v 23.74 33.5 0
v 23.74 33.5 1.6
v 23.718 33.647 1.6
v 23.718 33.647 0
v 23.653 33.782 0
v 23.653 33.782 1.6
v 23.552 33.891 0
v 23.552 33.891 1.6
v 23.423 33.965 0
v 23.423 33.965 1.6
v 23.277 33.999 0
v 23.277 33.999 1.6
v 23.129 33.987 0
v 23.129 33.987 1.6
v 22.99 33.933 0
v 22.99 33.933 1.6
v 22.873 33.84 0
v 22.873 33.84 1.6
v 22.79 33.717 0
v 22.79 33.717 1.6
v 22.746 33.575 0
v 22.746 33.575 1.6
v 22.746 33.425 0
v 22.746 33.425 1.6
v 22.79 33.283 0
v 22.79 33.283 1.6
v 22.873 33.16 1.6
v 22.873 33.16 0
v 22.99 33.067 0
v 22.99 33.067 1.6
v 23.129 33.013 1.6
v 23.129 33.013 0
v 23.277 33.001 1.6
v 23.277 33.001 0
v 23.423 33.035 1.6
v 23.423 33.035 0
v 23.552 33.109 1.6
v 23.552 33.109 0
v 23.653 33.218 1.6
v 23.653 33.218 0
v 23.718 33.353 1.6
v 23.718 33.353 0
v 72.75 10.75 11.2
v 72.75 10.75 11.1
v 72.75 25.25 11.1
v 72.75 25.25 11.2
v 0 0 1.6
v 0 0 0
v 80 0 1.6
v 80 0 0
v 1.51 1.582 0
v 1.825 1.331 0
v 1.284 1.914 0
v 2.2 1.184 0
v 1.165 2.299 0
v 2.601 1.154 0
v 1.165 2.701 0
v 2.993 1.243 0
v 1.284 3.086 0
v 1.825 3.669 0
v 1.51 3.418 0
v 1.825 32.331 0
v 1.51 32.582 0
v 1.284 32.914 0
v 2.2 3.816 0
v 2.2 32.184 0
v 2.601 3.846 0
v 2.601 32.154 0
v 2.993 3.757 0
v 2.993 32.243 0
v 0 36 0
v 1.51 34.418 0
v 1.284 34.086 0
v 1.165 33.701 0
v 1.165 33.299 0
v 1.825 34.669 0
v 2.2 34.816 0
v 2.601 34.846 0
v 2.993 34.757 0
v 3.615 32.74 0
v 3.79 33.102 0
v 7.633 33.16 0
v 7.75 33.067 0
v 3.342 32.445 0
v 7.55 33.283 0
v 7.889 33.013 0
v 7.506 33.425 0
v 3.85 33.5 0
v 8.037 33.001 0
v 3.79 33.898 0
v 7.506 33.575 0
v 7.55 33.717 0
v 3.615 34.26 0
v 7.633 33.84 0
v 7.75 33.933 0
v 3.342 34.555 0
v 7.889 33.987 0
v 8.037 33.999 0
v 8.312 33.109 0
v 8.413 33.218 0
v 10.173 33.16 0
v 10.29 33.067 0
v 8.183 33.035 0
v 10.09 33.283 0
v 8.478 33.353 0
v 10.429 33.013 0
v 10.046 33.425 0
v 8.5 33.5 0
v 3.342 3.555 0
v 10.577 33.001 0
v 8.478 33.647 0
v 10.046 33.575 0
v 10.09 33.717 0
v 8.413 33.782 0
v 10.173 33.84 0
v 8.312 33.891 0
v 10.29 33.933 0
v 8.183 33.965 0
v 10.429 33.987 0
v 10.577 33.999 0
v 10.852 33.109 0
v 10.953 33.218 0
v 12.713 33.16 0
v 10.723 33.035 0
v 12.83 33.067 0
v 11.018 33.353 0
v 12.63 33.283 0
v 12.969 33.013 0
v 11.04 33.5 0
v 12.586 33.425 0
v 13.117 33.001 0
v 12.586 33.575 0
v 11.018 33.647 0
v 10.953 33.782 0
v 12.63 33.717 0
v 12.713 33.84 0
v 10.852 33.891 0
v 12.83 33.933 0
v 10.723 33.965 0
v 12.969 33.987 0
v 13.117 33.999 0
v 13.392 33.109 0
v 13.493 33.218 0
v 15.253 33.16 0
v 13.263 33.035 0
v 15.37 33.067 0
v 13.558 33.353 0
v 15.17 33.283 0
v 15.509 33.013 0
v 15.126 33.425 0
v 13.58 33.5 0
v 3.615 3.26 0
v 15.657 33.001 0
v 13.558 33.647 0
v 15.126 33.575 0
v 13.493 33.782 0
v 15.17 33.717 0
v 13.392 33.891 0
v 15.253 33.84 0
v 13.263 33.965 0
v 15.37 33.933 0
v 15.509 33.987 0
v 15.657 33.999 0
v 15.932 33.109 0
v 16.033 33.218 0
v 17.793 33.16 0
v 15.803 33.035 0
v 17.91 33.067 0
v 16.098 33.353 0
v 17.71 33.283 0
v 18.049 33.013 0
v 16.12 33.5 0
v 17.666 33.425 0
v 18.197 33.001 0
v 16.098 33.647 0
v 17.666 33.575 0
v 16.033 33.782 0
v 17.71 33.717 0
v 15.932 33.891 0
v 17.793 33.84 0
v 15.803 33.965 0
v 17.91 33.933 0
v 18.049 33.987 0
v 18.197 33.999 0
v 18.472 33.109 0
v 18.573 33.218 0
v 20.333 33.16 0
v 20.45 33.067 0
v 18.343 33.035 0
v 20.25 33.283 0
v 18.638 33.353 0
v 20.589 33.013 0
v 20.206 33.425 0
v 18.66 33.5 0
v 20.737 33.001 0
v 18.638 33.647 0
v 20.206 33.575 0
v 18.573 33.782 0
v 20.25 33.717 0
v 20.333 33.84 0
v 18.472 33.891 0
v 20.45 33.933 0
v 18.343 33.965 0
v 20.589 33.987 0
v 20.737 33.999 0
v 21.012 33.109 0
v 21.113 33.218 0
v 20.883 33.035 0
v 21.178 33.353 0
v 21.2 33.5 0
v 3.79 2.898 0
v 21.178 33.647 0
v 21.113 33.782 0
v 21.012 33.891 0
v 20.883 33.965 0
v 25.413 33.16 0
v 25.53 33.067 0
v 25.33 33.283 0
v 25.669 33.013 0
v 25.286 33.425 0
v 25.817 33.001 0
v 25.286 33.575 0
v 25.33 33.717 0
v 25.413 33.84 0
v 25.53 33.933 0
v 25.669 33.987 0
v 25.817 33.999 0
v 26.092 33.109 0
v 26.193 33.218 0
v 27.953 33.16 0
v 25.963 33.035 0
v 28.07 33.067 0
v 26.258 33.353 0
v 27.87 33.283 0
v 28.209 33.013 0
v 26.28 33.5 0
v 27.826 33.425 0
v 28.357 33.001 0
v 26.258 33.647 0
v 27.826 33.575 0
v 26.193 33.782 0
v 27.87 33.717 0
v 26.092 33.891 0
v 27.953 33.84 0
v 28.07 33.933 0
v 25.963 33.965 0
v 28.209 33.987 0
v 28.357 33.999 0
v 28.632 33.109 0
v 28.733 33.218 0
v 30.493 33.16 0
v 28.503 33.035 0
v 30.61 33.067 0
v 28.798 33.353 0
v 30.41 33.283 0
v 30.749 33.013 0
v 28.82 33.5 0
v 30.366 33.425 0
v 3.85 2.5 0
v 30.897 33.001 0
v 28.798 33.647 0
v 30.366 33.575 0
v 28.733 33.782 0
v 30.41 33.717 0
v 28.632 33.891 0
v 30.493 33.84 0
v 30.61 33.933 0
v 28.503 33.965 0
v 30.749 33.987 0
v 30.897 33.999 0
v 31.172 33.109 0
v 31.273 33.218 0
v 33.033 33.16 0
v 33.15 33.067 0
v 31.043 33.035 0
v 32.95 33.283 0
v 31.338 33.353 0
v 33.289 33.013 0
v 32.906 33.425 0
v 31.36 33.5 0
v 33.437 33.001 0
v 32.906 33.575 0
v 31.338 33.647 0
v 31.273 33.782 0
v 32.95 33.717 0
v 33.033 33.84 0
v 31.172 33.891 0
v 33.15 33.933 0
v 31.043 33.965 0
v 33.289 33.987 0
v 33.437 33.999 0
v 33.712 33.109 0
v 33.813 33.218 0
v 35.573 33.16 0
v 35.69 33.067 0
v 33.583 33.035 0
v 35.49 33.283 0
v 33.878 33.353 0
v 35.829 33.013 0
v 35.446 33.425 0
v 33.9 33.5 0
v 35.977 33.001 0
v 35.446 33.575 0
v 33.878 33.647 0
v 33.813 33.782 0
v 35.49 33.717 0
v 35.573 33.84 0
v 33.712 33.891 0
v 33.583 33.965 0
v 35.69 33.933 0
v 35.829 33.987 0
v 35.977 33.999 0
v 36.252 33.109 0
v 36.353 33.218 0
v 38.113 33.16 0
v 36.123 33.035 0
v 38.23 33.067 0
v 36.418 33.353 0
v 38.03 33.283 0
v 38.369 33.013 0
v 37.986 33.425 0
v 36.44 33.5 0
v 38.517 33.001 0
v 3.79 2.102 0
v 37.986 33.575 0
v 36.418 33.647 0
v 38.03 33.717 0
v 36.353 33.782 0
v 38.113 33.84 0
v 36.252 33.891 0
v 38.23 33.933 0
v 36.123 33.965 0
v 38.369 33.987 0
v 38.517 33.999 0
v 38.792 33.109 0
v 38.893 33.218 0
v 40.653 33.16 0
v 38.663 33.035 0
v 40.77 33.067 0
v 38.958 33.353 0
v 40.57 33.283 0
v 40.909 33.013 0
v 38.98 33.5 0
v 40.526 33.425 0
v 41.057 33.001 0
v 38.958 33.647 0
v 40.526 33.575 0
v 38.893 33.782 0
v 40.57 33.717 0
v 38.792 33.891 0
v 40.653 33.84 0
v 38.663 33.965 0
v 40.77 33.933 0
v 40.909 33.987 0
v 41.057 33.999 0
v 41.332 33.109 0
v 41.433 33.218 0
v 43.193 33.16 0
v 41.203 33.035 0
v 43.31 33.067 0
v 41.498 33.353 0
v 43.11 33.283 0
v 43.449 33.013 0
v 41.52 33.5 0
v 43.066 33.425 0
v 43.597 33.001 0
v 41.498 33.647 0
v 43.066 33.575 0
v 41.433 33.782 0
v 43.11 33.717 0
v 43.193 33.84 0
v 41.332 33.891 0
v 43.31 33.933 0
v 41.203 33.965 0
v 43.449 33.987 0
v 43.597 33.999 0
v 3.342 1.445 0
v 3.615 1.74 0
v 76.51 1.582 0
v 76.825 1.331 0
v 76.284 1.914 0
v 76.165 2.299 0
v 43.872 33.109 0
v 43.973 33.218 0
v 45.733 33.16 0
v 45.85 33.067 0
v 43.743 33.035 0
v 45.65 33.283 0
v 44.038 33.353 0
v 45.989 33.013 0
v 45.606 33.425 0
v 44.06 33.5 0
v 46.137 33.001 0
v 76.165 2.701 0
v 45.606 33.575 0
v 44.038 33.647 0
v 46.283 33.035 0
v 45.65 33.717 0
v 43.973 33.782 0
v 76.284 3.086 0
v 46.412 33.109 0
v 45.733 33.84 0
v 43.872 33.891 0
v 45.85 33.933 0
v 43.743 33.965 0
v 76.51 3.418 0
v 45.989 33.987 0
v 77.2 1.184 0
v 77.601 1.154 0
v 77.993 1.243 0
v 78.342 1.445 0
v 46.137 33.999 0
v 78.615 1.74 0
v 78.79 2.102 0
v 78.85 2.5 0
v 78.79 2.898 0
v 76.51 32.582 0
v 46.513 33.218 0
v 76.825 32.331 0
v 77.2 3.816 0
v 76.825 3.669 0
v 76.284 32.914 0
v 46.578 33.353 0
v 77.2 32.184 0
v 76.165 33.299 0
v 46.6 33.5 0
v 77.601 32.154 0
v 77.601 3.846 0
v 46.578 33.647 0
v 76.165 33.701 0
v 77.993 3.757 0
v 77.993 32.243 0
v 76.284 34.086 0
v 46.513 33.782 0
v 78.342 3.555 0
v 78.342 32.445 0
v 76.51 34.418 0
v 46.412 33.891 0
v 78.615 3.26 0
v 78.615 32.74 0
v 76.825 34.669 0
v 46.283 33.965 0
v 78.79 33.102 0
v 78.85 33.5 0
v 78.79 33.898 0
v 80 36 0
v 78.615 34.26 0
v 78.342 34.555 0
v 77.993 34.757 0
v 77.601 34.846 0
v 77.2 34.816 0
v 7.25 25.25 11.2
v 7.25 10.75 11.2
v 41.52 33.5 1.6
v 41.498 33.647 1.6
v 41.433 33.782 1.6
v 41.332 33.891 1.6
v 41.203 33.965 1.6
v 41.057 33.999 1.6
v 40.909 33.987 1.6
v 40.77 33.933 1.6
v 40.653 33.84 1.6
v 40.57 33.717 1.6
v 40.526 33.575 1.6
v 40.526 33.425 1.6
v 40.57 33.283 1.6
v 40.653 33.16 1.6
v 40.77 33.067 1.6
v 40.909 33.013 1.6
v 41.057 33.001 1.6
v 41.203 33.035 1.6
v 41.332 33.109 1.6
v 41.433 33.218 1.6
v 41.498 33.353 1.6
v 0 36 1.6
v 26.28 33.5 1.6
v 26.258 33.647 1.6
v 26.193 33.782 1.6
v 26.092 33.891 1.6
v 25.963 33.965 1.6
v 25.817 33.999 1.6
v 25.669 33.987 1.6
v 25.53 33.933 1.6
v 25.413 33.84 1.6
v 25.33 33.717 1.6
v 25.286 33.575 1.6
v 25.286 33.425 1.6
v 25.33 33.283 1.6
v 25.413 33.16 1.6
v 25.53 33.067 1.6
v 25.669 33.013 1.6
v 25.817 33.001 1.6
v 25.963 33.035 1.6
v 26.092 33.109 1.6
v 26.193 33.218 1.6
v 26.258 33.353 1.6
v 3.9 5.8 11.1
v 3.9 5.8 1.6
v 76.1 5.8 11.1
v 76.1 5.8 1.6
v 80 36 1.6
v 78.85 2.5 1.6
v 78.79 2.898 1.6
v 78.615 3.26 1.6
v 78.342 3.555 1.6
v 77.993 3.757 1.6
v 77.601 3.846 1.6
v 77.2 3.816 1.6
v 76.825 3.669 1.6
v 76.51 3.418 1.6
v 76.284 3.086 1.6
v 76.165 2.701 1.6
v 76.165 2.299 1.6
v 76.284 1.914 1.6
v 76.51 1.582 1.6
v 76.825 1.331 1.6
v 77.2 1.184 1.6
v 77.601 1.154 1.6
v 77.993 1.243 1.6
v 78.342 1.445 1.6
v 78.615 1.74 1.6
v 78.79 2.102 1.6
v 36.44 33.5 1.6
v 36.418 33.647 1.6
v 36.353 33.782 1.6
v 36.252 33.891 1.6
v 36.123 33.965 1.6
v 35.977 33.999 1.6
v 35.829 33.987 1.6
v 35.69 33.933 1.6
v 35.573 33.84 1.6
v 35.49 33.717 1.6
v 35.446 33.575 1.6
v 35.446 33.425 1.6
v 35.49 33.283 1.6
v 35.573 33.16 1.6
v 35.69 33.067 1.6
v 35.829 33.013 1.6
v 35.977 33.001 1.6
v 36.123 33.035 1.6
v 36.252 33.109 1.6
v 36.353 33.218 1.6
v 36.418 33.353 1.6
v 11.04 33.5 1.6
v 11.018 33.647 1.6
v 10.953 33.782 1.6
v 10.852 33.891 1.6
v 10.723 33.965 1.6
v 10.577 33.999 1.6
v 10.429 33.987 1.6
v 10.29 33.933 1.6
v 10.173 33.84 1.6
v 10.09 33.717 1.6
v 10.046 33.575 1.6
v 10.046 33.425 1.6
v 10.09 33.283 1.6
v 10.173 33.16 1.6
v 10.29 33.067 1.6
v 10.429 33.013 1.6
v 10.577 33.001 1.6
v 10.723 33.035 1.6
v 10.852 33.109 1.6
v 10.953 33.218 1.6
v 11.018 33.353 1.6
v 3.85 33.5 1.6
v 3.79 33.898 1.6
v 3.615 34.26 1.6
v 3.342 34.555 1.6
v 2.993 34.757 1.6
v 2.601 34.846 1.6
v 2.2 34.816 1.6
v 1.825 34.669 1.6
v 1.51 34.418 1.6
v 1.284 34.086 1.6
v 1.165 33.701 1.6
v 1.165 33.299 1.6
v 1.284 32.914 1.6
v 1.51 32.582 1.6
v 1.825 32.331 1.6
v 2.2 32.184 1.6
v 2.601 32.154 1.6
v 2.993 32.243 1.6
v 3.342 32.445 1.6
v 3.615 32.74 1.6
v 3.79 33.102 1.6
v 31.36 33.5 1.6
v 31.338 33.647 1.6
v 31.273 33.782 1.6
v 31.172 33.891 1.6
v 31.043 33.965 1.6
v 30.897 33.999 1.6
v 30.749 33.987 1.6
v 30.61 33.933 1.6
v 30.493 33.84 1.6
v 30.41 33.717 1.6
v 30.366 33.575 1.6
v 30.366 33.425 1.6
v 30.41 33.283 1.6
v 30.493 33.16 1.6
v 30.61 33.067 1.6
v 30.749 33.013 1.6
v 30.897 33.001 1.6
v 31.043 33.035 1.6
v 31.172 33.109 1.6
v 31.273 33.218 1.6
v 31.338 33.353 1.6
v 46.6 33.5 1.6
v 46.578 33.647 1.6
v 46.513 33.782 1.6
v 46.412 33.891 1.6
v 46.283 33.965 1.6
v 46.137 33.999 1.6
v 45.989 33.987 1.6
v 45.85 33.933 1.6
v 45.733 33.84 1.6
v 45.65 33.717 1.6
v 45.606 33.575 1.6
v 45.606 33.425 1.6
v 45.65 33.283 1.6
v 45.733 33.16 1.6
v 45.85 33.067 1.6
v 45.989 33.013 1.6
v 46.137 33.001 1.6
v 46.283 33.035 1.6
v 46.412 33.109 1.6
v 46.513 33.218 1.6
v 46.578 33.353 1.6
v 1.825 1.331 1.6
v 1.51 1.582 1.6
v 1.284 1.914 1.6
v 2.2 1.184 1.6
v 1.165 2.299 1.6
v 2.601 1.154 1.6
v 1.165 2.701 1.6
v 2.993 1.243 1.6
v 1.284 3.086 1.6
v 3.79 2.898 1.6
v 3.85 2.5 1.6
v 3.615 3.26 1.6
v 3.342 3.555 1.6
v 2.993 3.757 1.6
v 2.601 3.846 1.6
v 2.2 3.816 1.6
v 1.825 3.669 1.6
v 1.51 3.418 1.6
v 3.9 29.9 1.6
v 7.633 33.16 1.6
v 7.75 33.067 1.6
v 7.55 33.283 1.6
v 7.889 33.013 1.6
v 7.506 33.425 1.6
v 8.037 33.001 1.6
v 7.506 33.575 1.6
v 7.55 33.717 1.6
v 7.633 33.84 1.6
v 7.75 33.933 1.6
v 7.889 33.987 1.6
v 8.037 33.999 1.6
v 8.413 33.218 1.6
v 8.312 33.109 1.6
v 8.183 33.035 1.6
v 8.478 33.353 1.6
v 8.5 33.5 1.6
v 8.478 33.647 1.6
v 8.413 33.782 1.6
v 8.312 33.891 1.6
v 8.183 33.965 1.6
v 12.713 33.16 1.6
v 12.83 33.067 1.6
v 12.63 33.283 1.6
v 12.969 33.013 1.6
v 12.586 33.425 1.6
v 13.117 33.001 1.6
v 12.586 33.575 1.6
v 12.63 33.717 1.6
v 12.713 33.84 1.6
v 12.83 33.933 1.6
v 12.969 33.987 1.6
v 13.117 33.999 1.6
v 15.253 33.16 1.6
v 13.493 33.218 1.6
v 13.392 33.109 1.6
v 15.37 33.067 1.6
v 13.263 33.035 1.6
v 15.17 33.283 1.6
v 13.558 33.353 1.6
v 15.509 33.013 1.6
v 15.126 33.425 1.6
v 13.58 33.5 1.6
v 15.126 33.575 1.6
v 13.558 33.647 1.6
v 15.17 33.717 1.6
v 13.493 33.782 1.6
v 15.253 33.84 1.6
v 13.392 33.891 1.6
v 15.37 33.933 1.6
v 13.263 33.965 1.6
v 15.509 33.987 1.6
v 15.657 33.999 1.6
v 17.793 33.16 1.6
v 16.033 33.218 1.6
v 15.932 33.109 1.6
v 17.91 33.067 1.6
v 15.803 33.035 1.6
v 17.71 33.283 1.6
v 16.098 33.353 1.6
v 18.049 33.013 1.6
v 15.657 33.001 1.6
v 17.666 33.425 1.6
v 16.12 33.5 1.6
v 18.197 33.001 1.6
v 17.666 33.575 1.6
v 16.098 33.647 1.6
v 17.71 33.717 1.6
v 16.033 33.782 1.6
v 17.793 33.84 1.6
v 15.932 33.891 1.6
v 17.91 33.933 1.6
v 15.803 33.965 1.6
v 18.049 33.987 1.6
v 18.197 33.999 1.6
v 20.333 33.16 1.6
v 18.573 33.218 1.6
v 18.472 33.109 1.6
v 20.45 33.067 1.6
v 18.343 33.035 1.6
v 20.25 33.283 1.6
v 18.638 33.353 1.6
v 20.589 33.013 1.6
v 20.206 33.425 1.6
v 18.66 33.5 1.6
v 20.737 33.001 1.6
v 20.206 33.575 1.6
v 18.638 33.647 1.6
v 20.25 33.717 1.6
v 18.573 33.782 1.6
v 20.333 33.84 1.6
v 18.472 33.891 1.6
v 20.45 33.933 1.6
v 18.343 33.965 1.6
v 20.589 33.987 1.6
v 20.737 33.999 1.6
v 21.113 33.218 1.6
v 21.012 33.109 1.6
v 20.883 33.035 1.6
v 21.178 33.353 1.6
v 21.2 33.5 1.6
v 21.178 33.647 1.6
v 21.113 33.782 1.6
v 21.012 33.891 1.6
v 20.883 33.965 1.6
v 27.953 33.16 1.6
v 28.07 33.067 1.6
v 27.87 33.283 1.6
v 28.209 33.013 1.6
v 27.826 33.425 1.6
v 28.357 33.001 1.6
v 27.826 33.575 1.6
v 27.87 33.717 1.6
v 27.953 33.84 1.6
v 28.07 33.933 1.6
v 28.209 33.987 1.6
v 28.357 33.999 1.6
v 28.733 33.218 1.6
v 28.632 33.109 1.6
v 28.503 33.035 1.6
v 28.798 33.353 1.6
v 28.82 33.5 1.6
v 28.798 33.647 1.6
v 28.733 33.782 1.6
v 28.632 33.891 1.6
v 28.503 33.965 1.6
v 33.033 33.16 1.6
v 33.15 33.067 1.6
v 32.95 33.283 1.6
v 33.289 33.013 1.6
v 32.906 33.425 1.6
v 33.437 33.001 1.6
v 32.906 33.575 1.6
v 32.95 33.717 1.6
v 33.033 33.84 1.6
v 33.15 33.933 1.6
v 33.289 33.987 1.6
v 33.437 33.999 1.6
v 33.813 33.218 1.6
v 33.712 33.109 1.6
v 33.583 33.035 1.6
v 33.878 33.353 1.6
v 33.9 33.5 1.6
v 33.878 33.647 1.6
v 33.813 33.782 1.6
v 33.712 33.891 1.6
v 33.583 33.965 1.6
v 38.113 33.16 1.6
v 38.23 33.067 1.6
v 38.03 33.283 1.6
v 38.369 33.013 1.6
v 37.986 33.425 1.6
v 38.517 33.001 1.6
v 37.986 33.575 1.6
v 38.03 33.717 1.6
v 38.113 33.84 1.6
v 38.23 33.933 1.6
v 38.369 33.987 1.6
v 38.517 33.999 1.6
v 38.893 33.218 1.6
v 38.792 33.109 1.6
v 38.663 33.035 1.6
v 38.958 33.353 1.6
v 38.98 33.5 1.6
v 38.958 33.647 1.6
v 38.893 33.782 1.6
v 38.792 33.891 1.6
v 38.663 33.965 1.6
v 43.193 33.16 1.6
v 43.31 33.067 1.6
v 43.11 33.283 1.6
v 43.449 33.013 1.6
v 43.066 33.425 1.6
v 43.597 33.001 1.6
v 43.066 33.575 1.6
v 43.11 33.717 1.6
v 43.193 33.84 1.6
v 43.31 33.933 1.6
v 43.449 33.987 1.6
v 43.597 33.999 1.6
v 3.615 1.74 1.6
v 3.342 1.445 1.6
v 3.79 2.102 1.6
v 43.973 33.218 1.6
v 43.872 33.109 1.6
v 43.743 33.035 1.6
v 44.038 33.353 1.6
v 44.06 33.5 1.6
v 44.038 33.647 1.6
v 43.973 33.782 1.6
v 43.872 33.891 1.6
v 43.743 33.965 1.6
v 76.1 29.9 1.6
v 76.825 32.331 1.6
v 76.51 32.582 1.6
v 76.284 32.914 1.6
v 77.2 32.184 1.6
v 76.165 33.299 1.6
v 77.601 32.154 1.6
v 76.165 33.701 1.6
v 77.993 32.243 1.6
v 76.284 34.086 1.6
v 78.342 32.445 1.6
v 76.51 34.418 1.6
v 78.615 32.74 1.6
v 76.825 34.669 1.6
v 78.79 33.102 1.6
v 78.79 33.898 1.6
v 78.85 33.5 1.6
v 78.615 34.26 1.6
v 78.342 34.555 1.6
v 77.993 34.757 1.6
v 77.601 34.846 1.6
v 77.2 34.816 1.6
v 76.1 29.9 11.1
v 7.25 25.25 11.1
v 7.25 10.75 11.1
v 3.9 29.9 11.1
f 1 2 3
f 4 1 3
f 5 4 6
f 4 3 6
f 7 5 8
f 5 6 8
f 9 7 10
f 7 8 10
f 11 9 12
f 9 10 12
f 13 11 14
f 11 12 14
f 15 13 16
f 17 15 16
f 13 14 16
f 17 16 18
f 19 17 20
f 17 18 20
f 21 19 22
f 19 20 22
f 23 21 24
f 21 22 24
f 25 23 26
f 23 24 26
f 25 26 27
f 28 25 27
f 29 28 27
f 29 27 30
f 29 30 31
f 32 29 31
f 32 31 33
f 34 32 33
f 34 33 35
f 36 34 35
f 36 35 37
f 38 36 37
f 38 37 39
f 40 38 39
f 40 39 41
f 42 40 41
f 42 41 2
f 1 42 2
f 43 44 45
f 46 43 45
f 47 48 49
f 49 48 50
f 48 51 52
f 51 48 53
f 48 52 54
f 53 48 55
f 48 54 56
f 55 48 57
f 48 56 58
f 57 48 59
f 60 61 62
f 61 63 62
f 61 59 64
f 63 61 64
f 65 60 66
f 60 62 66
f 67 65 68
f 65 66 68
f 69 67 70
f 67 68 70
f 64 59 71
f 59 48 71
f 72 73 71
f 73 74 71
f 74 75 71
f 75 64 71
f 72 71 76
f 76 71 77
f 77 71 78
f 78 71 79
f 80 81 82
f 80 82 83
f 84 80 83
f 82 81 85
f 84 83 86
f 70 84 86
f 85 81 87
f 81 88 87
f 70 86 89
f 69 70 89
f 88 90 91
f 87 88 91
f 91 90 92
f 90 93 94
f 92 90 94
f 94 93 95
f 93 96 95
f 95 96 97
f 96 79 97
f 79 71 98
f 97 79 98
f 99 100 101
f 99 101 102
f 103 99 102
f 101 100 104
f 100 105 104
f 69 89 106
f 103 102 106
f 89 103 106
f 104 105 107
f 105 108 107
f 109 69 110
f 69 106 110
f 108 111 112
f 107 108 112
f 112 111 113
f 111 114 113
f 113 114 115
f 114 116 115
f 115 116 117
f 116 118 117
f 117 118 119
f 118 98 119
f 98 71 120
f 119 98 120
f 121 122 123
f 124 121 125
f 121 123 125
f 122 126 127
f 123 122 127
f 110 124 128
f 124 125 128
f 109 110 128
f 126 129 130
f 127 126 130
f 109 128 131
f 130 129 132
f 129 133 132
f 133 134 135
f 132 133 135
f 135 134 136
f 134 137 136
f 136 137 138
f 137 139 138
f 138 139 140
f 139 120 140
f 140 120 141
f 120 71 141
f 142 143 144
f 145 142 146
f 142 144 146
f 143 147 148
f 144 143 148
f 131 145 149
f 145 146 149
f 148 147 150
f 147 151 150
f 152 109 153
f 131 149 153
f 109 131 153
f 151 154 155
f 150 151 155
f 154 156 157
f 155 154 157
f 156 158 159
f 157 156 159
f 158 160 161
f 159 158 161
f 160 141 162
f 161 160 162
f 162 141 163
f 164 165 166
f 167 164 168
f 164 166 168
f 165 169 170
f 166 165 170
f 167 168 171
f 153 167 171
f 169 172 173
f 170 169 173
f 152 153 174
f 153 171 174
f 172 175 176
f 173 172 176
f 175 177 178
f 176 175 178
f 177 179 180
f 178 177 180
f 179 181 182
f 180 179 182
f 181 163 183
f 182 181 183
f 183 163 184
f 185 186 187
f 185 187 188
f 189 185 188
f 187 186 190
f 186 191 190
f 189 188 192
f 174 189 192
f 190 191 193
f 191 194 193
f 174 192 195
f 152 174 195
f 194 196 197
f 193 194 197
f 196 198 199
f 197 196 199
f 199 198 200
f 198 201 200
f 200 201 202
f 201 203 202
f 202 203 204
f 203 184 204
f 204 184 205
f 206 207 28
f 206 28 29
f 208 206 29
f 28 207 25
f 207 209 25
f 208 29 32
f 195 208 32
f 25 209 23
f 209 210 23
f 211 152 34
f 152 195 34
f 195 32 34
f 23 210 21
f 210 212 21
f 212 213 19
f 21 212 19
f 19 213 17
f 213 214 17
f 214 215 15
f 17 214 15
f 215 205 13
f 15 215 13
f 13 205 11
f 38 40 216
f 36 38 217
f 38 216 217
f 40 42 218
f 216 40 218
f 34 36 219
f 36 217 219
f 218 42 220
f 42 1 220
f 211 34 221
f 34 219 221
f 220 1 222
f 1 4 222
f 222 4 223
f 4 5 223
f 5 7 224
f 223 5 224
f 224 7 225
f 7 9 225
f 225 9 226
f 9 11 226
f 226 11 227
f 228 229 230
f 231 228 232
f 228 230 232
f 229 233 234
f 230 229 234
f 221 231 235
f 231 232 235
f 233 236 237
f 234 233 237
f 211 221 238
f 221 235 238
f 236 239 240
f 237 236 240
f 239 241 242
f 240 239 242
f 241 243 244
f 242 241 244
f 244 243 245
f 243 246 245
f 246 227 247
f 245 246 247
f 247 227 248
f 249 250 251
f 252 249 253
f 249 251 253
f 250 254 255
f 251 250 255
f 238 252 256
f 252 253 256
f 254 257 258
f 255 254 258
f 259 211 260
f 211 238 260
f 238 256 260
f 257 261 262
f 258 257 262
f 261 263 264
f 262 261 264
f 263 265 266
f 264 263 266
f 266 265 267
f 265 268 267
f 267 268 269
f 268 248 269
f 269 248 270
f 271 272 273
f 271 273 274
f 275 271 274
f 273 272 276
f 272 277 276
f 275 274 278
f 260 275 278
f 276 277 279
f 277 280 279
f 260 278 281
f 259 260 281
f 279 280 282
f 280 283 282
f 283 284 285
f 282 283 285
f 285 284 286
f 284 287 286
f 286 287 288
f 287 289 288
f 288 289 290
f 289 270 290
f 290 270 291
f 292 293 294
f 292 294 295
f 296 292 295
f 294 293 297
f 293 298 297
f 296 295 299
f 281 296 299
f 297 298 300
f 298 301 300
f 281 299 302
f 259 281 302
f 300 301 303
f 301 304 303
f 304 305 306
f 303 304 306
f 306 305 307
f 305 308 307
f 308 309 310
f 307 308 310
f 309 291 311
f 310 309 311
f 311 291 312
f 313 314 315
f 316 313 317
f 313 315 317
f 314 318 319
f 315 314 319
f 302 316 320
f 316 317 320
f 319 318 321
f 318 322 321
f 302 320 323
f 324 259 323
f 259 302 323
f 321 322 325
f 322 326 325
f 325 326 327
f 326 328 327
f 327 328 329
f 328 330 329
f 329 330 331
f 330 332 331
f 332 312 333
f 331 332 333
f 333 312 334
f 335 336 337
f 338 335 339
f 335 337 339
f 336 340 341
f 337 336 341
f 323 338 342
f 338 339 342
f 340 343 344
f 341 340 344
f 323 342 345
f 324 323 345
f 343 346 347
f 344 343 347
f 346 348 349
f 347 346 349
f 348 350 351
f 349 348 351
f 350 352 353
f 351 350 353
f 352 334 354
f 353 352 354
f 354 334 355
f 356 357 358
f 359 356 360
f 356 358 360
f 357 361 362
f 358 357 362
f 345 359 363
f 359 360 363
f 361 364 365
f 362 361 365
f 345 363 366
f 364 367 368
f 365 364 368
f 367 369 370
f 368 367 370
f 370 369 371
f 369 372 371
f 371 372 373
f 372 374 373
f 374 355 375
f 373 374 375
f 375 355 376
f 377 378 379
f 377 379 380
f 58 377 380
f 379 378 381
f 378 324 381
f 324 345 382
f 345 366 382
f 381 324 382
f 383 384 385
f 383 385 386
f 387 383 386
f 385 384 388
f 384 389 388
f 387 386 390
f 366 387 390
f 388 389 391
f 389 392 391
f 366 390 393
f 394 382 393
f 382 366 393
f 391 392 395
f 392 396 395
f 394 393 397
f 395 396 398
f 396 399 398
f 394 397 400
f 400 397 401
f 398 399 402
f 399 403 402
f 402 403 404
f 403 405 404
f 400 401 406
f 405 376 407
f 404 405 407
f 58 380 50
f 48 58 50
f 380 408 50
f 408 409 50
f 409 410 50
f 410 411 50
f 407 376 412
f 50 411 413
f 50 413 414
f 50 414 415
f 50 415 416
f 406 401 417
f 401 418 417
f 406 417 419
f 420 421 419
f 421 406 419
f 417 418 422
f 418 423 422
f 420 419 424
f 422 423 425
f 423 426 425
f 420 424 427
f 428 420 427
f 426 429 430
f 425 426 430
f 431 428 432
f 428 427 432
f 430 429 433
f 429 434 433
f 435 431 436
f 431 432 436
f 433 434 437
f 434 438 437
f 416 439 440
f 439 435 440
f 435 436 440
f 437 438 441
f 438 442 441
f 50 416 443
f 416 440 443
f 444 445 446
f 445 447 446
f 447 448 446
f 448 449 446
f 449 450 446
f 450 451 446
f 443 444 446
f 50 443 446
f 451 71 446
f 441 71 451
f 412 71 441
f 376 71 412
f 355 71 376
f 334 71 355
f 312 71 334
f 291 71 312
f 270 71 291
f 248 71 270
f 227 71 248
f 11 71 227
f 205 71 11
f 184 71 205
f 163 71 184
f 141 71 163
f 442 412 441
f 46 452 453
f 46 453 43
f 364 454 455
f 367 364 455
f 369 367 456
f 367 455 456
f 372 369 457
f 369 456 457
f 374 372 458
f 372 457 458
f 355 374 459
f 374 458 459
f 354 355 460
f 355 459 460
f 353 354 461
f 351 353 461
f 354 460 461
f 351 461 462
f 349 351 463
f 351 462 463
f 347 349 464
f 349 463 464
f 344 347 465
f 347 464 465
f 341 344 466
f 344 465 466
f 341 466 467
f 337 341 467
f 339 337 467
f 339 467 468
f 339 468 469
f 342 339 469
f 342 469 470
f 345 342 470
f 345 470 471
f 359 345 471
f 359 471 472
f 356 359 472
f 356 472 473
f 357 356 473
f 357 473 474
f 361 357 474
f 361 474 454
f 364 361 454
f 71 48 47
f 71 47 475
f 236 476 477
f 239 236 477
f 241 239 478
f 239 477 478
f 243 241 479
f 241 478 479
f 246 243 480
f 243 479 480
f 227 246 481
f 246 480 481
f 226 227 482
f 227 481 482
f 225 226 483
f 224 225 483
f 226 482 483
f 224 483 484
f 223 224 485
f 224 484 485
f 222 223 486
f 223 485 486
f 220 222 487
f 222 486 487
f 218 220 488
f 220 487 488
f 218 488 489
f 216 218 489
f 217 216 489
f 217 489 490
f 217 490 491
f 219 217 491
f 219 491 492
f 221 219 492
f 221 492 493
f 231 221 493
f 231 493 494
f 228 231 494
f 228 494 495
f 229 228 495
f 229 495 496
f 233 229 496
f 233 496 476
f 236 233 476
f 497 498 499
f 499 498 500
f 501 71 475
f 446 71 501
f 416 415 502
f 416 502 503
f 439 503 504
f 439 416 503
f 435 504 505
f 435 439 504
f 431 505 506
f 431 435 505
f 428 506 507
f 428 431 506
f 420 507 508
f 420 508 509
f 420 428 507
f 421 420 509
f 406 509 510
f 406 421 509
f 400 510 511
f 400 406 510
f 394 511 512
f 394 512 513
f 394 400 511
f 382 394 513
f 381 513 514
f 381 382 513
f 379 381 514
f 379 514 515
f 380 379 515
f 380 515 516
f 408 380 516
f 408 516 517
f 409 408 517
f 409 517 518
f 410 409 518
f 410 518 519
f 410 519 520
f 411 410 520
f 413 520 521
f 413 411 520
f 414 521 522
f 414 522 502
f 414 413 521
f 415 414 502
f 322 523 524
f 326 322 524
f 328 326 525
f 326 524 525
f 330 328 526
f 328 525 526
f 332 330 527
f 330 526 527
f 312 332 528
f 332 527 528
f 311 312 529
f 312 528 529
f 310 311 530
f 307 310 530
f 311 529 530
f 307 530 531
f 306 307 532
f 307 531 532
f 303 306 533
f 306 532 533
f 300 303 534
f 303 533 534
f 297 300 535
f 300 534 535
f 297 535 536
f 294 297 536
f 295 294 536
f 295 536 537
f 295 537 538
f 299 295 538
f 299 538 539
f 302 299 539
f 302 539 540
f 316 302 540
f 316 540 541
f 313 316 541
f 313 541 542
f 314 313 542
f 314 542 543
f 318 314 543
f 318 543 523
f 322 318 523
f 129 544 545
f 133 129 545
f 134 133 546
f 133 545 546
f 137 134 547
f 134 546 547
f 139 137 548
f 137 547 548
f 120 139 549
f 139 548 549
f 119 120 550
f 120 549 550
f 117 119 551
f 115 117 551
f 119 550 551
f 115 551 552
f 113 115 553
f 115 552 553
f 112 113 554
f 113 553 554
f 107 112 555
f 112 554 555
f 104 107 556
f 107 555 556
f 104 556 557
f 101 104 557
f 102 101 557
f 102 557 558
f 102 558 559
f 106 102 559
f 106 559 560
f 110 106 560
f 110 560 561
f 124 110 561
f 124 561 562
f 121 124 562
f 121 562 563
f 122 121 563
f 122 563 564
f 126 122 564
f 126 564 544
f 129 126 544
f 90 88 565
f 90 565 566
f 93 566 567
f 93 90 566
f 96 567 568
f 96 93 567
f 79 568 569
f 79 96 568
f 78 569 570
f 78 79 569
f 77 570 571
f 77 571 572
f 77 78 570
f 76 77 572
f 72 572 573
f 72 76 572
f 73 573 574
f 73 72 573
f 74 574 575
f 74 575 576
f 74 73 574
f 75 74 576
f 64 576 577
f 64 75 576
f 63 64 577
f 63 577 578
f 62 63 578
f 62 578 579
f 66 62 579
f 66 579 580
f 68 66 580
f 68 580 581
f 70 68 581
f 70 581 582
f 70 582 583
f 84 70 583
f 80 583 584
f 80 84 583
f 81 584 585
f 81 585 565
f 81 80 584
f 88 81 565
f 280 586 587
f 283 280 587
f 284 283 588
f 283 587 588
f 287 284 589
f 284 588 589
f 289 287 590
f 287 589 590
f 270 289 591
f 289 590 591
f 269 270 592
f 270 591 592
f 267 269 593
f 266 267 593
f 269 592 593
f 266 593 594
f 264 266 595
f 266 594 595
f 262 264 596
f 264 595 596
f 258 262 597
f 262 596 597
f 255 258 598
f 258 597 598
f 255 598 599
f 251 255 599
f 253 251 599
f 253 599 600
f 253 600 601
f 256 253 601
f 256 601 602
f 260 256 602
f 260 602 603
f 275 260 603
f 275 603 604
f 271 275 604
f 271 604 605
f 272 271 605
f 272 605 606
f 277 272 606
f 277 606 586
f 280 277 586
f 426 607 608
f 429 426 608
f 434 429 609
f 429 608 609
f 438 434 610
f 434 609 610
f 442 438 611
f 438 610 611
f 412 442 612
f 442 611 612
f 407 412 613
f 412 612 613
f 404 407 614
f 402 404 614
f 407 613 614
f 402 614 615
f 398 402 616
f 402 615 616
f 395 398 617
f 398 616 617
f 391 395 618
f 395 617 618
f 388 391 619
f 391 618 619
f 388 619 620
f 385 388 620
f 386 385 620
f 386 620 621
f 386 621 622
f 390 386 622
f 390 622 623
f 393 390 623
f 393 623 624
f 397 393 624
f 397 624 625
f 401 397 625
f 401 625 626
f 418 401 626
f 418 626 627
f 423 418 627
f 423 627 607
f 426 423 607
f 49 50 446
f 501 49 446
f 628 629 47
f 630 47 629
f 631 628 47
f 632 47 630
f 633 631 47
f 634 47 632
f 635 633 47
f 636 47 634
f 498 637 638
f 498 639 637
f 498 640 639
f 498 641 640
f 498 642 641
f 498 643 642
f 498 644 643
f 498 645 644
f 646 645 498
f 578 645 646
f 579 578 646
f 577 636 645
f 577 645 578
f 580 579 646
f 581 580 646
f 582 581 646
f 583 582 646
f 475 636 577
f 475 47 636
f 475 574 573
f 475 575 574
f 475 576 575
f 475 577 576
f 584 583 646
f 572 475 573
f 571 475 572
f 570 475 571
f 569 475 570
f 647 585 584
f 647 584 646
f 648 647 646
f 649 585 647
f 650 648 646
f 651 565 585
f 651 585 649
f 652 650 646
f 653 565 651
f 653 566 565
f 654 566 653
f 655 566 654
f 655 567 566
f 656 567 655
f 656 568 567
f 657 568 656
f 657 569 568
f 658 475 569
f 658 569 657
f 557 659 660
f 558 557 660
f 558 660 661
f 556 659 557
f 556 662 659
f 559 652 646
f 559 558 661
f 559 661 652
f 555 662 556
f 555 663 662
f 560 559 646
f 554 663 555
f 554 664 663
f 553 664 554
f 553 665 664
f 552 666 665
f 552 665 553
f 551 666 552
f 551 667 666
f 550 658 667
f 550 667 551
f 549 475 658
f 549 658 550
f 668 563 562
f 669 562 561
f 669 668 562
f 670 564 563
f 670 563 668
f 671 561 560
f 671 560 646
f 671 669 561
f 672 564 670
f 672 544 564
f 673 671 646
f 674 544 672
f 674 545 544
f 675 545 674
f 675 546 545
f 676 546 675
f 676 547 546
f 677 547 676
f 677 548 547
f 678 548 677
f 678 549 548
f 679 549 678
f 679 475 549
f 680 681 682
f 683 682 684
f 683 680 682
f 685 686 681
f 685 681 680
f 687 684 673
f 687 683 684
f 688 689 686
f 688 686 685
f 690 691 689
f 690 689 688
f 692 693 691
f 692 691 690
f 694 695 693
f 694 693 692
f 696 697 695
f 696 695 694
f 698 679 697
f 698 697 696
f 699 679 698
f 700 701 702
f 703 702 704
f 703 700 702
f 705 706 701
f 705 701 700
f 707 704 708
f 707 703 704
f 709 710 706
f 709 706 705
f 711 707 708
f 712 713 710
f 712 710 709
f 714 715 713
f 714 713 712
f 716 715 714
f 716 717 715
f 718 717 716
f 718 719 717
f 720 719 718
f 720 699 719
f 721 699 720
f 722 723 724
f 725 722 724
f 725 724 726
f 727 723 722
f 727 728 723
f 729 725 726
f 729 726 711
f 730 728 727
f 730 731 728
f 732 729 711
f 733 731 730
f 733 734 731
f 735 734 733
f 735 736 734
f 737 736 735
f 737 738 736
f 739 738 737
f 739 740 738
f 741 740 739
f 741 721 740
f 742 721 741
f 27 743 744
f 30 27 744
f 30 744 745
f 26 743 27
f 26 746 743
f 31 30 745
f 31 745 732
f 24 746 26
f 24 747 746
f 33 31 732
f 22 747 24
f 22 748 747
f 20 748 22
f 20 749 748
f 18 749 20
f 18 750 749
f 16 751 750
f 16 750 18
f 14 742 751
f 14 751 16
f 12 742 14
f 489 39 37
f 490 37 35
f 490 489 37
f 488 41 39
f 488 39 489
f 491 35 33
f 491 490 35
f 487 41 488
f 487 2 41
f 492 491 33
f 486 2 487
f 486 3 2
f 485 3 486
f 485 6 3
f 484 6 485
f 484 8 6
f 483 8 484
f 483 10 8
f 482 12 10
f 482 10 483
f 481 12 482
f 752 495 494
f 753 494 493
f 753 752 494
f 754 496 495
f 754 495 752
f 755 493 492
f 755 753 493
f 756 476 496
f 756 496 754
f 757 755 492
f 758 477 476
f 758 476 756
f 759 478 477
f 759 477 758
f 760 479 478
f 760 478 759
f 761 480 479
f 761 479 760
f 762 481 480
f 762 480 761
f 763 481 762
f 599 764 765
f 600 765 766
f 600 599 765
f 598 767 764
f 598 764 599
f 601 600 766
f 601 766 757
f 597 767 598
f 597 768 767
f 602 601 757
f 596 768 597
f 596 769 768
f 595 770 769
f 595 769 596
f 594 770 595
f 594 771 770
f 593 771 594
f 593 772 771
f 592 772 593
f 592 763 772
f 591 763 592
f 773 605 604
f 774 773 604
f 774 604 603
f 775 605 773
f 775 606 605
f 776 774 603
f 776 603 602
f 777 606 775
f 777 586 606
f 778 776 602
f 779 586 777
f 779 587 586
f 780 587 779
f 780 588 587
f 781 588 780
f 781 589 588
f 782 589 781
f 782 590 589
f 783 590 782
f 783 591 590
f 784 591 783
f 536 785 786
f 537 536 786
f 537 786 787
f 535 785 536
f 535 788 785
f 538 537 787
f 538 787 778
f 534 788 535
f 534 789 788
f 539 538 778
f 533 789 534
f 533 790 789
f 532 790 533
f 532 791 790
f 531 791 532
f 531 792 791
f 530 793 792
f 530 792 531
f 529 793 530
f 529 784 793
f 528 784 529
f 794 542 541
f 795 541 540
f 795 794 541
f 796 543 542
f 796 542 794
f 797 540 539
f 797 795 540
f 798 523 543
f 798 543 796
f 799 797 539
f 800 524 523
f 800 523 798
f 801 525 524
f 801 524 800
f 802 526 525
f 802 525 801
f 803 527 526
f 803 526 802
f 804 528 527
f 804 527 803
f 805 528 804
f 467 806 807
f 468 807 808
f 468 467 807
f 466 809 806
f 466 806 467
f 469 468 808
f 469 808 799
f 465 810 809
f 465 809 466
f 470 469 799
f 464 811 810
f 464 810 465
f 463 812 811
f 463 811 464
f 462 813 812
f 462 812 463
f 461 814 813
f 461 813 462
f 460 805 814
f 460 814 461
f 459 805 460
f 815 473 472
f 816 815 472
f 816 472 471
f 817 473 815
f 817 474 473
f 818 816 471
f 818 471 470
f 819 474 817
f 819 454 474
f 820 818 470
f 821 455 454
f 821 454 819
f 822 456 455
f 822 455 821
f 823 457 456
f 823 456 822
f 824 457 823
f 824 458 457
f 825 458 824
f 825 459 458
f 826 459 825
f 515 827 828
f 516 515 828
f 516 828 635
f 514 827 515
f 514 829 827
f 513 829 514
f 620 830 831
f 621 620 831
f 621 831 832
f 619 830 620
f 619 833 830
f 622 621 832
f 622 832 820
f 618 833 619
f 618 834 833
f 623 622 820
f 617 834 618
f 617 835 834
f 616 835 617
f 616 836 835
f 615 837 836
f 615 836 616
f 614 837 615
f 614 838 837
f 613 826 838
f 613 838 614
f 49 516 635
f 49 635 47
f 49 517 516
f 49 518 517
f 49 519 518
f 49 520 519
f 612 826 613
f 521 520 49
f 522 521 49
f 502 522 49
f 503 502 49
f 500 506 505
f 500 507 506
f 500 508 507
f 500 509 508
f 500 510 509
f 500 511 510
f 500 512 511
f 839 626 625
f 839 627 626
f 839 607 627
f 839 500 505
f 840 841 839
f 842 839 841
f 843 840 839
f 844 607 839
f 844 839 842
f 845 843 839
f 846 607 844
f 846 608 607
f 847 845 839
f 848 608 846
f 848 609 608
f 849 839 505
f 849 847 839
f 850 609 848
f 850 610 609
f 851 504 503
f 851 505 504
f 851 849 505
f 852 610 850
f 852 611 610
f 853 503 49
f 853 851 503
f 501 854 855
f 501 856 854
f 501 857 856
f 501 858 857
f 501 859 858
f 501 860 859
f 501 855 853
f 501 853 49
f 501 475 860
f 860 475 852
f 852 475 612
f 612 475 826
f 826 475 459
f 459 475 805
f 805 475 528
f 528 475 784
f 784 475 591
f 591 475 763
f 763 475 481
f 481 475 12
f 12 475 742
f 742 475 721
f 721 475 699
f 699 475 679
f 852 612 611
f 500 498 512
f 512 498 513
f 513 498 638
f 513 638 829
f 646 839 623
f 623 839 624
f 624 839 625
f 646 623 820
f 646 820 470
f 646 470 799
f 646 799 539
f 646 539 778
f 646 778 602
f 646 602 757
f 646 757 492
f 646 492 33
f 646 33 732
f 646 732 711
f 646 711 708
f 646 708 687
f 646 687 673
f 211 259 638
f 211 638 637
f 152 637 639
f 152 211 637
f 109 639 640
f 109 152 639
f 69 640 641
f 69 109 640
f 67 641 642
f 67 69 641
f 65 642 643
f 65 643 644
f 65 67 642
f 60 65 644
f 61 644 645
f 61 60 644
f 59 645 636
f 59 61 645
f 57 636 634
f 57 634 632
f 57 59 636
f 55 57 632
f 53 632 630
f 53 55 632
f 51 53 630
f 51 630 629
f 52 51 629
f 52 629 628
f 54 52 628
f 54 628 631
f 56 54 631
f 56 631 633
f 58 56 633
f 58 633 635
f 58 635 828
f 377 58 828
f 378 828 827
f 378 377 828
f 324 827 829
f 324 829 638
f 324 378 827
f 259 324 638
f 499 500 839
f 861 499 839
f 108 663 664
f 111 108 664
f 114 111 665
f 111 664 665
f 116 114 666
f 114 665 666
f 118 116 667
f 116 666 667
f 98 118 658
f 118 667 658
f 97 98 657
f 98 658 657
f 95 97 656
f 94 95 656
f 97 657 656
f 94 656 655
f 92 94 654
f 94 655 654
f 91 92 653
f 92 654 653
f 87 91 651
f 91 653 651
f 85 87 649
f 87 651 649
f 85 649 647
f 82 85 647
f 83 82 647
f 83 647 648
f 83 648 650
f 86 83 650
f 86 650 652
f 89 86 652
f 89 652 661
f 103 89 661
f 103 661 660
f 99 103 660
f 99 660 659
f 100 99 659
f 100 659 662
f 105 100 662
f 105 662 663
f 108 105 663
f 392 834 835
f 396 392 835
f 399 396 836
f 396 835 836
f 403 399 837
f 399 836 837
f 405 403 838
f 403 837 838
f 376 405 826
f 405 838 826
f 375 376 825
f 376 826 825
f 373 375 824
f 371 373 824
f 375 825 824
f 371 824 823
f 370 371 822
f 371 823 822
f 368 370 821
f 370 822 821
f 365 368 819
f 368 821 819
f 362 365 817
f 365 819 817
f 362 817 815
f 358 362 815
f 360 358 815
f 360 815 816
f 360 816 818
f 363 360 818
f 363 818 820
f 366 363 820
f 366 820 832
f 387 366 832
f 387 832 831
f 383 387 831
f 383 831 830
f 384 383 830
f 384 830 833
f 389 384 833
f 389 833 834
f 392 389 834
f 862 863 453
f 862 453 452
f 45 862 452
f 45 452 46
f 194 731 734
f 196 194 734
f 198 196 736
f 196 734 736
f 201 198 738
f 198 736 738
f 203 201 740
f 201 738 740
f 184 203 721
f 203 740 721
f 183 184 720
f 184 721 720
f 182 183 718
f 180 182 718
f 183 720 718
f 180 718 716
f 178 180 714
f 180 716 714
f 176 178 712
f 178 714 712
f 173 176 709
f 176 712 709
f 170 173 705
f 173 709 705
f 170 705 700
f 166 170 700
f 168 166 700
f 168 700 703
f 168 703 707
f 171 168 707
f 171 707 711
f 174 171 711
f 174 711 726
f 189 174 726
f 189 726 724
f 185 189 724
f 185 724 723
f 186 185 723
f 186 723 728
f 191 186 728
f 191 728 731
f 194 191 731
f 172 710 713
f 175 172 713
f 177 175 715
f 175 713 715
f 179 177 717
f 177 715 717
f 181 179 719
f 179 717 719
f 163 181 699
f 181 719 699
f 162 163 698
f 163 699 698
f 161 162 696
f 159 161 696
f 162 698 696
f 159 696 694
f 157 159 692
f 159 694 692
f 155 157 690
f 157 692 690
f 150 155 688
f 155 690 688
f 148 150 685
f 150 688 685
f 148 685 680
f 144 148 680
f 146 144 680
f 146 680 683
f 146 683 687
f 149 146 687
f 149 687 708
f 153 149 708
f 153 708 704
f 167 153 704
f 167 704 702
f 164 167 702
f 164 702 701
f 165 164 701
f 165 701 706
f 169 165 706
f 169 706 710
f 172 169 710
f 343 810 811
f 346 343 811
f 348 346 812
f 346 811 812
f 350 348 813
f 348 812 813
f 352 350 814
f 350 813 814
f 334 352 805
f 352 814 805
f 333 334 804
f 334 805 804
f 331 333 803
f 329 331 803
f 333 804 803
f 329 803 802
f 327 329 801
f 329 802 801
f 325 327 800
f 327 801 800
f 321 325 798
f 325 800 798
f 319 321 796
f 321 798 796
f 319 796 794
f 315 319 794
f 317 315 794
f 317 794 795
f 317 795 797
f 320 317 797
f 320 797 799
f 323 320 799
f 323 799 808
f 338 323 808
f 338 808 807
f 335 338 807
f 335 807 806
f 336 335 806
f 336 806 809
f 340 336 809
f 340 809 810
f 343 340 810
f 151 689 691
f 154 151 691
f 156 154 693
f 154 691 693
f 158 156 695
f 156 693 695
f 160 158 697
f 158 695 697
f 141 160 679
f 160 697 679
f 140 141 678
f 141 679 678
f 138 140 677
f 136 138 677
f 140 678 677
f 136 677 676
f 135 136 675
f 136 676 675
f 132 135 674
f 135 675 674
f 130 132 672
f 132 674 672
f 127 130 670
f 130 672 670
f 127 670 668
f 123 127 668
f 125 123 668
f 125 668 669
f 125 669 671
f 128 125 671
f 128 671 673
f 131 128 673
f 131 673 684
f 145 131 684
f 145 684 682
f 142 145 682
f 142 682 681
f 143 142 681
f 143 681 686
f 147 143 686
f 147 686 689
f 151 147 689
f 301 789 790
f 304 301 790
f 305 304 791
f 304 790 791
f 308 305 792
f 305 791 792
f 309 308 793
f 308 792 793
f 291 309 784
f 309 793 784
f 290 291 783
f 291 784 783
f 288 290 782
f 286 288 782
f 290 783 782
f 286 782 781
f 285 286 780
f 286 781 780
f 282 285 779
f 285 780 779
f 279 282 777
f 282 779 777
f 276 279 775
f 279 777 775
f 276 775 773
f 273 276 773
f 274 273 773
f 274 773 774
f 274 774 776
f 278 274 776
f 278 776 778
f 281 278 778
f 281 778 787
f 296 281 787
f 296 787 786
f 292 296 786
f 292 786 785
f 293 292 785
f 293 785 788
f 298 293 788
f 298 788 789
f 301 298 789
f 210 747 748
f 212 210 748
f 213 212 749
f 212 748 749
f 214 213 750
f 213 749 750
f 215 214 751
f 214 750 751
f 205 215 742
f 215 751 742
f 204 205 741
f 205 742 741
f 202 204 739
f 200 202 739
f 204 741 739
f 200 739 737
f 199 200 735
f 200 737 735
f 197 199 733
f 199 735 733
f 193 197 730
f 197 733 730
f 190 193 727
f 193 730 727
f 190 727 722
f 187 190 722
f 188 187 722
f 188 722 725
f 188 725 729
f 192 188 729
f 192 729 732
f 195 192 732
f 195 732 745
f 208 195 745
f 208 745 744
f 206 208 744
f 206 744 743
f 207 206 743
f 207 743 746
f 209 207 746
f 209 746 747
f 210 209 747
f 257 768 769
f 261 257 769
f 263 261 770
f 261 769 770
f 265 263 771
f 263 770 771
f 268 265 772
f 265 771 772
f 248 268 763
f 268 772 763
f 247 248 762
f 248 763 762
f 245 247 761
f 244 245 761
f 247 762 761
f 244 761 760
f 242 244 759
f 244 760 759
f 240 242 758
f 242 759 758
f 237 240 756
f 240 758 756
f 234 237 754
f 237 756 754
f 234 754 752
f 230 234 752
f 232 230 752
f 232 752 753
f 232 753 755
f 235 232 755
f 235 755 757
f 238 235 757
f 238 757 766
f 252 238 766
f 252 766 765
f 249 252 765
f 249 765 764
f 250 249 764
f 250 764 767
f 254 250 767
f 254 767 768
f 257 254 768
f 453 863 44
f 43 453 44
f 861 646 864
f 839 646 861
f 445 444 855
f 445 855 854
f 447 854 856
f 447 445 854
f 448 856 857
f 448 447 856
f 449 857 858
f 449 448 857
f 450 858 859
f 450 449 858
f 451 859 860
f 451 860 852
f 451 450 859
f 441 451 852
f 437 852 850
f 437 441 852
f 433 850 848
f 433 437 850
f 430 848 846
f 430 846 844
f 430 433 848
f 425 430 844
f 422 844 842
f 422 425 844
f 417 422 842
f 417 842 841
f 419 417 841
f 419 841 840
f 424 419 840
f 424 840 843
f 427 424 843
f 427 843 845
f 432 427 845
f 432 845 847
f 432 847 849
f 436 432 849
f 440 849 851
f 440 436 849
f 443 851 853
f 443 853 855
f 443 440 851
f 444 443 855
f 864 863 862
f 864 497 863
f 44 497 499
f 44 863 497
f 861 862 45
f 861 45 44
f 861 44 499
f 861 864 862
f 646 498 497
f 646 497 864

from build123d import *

# Parameters (mm, degrees)
ESBO_O1_W                = 80
ESBO_O1_H                = 36
ESBO_O1_R                = 1.35
RESSALTO_EXTRUS_O1_DEPTH = 1.6
ESBO_O4_W                = 65.5
ESBO_O4_H                = 14.5
RESSALTO_EXTRUS_O2_DEPTH = 9.6
ESBO_O3_W                = 72.2
ESBO_O3_H                = 24.1
RESSALTO_EXTRUS_O3_DEPTH = 9.5
ESBO_O5_R                = 0.5
CORTE_EXTRUS_O1_DEPTH    = 2.6


with BuildPart() as part:
    # Esboço1 → Ressalto-extrusão1 (new body)
    with BuildSketch(Plane.XY):
        with Locations((40, 18)):
            Rectangle(ESBO_O1_W, ESBO_O1_H)
        with Locations((2.5, 33.5)):
            Circle(ESBO_O1_R, mode=Mode.SUBTRACT)
        with Locations((2.5, 2.5)):
            Circle(ESBO_O1_R, mode=Mode.SUBTRACT)
        with Locations((77.5, 33.5)):
            Circle(ESBO_O1_R, mode=Mode.SUBTRACT)
        with Locations((77.5, 2.5)):
            Circle(ESBO_O1_R, mode=Mode.SUBTRACT)
    extrude(amount=RESSALTO_EXTRUS_O1_DEPTH)

    # Esboço4 → Ressalto-extrusão2 (add)
    with BuildSketch(Plane.XY.offset(1.6)):
        with Locations((40, 18)):
            Rectangle(ESBO_O4_W, ESBO_O4_H)
    extrude(amount=RESSALTO_EXTRUS_O2_DEPTH)

    # Esboço3 → Ressalto-extrusão3 (add)
    with BuildSketch(Plane.XY.offset(1.6)):
        with Locations((40, 17.85)):
            Rectangle(ESBO_O3_W, ESBO_O3_H)
    extrude(amount=RESSALTO_EXTRUS_O3_DEPTH)

    # Esboço5 → Corte-extrusão1 (cut, through all)
    with BuildSketch(Plane.XY.offset(1.6)):
        with Locations((8, 33.5)):
            Circle(ESBO_O5_R)
        with Locations((10.54, 33.5)):
            Circle(ESBO_O5_R)
        with Locations((13.08, 33.5)):
            Circle(ESBO_O5_R)
        with Locations((15.62, 33.5)):
            Circle(ESBO_O5_R)
        with Locations((18.16, 33.5)):
            Circle(ESBO_O5_R)
        with Locations((20.7, 33.5)):
            Circle(ESBO_O5_R)
        with Locations((23.24, 33.5)):
            Circle(ESBO_O5_R)
        with Locations((25.78, 33.5)):
            Circle(ESBO_O5_R)
        with Locations((28.32, 33.5)):
            Circle(ESBO_O5_R)
        with Locations((30.86, 33.5)):
            Circle(ESBO_O5_R)
        with Locations((33.4, 33.5)):
            Circle(ESBO_O5_R)
        with Locations((35.94, 33.5)):
            Circle(ESBO_O5_R)
        with Locations((38.48, 33.5)):
            Circle(ESBO_O5_R)
        with Locations((41.02, 33.5)):
            Circle(ESBO_O5_R)
        with Locations((43.56, 33.5)):
            Circle(ESBO_O5_R)
        with Locations((46.1, 33.5)):
            Circle(ESBO_O5_R)
    extrude(amount=-CORTE_EXTRUS_O1_DEPTH, mode=Mode.SUBTRACT)


solid = part.part
